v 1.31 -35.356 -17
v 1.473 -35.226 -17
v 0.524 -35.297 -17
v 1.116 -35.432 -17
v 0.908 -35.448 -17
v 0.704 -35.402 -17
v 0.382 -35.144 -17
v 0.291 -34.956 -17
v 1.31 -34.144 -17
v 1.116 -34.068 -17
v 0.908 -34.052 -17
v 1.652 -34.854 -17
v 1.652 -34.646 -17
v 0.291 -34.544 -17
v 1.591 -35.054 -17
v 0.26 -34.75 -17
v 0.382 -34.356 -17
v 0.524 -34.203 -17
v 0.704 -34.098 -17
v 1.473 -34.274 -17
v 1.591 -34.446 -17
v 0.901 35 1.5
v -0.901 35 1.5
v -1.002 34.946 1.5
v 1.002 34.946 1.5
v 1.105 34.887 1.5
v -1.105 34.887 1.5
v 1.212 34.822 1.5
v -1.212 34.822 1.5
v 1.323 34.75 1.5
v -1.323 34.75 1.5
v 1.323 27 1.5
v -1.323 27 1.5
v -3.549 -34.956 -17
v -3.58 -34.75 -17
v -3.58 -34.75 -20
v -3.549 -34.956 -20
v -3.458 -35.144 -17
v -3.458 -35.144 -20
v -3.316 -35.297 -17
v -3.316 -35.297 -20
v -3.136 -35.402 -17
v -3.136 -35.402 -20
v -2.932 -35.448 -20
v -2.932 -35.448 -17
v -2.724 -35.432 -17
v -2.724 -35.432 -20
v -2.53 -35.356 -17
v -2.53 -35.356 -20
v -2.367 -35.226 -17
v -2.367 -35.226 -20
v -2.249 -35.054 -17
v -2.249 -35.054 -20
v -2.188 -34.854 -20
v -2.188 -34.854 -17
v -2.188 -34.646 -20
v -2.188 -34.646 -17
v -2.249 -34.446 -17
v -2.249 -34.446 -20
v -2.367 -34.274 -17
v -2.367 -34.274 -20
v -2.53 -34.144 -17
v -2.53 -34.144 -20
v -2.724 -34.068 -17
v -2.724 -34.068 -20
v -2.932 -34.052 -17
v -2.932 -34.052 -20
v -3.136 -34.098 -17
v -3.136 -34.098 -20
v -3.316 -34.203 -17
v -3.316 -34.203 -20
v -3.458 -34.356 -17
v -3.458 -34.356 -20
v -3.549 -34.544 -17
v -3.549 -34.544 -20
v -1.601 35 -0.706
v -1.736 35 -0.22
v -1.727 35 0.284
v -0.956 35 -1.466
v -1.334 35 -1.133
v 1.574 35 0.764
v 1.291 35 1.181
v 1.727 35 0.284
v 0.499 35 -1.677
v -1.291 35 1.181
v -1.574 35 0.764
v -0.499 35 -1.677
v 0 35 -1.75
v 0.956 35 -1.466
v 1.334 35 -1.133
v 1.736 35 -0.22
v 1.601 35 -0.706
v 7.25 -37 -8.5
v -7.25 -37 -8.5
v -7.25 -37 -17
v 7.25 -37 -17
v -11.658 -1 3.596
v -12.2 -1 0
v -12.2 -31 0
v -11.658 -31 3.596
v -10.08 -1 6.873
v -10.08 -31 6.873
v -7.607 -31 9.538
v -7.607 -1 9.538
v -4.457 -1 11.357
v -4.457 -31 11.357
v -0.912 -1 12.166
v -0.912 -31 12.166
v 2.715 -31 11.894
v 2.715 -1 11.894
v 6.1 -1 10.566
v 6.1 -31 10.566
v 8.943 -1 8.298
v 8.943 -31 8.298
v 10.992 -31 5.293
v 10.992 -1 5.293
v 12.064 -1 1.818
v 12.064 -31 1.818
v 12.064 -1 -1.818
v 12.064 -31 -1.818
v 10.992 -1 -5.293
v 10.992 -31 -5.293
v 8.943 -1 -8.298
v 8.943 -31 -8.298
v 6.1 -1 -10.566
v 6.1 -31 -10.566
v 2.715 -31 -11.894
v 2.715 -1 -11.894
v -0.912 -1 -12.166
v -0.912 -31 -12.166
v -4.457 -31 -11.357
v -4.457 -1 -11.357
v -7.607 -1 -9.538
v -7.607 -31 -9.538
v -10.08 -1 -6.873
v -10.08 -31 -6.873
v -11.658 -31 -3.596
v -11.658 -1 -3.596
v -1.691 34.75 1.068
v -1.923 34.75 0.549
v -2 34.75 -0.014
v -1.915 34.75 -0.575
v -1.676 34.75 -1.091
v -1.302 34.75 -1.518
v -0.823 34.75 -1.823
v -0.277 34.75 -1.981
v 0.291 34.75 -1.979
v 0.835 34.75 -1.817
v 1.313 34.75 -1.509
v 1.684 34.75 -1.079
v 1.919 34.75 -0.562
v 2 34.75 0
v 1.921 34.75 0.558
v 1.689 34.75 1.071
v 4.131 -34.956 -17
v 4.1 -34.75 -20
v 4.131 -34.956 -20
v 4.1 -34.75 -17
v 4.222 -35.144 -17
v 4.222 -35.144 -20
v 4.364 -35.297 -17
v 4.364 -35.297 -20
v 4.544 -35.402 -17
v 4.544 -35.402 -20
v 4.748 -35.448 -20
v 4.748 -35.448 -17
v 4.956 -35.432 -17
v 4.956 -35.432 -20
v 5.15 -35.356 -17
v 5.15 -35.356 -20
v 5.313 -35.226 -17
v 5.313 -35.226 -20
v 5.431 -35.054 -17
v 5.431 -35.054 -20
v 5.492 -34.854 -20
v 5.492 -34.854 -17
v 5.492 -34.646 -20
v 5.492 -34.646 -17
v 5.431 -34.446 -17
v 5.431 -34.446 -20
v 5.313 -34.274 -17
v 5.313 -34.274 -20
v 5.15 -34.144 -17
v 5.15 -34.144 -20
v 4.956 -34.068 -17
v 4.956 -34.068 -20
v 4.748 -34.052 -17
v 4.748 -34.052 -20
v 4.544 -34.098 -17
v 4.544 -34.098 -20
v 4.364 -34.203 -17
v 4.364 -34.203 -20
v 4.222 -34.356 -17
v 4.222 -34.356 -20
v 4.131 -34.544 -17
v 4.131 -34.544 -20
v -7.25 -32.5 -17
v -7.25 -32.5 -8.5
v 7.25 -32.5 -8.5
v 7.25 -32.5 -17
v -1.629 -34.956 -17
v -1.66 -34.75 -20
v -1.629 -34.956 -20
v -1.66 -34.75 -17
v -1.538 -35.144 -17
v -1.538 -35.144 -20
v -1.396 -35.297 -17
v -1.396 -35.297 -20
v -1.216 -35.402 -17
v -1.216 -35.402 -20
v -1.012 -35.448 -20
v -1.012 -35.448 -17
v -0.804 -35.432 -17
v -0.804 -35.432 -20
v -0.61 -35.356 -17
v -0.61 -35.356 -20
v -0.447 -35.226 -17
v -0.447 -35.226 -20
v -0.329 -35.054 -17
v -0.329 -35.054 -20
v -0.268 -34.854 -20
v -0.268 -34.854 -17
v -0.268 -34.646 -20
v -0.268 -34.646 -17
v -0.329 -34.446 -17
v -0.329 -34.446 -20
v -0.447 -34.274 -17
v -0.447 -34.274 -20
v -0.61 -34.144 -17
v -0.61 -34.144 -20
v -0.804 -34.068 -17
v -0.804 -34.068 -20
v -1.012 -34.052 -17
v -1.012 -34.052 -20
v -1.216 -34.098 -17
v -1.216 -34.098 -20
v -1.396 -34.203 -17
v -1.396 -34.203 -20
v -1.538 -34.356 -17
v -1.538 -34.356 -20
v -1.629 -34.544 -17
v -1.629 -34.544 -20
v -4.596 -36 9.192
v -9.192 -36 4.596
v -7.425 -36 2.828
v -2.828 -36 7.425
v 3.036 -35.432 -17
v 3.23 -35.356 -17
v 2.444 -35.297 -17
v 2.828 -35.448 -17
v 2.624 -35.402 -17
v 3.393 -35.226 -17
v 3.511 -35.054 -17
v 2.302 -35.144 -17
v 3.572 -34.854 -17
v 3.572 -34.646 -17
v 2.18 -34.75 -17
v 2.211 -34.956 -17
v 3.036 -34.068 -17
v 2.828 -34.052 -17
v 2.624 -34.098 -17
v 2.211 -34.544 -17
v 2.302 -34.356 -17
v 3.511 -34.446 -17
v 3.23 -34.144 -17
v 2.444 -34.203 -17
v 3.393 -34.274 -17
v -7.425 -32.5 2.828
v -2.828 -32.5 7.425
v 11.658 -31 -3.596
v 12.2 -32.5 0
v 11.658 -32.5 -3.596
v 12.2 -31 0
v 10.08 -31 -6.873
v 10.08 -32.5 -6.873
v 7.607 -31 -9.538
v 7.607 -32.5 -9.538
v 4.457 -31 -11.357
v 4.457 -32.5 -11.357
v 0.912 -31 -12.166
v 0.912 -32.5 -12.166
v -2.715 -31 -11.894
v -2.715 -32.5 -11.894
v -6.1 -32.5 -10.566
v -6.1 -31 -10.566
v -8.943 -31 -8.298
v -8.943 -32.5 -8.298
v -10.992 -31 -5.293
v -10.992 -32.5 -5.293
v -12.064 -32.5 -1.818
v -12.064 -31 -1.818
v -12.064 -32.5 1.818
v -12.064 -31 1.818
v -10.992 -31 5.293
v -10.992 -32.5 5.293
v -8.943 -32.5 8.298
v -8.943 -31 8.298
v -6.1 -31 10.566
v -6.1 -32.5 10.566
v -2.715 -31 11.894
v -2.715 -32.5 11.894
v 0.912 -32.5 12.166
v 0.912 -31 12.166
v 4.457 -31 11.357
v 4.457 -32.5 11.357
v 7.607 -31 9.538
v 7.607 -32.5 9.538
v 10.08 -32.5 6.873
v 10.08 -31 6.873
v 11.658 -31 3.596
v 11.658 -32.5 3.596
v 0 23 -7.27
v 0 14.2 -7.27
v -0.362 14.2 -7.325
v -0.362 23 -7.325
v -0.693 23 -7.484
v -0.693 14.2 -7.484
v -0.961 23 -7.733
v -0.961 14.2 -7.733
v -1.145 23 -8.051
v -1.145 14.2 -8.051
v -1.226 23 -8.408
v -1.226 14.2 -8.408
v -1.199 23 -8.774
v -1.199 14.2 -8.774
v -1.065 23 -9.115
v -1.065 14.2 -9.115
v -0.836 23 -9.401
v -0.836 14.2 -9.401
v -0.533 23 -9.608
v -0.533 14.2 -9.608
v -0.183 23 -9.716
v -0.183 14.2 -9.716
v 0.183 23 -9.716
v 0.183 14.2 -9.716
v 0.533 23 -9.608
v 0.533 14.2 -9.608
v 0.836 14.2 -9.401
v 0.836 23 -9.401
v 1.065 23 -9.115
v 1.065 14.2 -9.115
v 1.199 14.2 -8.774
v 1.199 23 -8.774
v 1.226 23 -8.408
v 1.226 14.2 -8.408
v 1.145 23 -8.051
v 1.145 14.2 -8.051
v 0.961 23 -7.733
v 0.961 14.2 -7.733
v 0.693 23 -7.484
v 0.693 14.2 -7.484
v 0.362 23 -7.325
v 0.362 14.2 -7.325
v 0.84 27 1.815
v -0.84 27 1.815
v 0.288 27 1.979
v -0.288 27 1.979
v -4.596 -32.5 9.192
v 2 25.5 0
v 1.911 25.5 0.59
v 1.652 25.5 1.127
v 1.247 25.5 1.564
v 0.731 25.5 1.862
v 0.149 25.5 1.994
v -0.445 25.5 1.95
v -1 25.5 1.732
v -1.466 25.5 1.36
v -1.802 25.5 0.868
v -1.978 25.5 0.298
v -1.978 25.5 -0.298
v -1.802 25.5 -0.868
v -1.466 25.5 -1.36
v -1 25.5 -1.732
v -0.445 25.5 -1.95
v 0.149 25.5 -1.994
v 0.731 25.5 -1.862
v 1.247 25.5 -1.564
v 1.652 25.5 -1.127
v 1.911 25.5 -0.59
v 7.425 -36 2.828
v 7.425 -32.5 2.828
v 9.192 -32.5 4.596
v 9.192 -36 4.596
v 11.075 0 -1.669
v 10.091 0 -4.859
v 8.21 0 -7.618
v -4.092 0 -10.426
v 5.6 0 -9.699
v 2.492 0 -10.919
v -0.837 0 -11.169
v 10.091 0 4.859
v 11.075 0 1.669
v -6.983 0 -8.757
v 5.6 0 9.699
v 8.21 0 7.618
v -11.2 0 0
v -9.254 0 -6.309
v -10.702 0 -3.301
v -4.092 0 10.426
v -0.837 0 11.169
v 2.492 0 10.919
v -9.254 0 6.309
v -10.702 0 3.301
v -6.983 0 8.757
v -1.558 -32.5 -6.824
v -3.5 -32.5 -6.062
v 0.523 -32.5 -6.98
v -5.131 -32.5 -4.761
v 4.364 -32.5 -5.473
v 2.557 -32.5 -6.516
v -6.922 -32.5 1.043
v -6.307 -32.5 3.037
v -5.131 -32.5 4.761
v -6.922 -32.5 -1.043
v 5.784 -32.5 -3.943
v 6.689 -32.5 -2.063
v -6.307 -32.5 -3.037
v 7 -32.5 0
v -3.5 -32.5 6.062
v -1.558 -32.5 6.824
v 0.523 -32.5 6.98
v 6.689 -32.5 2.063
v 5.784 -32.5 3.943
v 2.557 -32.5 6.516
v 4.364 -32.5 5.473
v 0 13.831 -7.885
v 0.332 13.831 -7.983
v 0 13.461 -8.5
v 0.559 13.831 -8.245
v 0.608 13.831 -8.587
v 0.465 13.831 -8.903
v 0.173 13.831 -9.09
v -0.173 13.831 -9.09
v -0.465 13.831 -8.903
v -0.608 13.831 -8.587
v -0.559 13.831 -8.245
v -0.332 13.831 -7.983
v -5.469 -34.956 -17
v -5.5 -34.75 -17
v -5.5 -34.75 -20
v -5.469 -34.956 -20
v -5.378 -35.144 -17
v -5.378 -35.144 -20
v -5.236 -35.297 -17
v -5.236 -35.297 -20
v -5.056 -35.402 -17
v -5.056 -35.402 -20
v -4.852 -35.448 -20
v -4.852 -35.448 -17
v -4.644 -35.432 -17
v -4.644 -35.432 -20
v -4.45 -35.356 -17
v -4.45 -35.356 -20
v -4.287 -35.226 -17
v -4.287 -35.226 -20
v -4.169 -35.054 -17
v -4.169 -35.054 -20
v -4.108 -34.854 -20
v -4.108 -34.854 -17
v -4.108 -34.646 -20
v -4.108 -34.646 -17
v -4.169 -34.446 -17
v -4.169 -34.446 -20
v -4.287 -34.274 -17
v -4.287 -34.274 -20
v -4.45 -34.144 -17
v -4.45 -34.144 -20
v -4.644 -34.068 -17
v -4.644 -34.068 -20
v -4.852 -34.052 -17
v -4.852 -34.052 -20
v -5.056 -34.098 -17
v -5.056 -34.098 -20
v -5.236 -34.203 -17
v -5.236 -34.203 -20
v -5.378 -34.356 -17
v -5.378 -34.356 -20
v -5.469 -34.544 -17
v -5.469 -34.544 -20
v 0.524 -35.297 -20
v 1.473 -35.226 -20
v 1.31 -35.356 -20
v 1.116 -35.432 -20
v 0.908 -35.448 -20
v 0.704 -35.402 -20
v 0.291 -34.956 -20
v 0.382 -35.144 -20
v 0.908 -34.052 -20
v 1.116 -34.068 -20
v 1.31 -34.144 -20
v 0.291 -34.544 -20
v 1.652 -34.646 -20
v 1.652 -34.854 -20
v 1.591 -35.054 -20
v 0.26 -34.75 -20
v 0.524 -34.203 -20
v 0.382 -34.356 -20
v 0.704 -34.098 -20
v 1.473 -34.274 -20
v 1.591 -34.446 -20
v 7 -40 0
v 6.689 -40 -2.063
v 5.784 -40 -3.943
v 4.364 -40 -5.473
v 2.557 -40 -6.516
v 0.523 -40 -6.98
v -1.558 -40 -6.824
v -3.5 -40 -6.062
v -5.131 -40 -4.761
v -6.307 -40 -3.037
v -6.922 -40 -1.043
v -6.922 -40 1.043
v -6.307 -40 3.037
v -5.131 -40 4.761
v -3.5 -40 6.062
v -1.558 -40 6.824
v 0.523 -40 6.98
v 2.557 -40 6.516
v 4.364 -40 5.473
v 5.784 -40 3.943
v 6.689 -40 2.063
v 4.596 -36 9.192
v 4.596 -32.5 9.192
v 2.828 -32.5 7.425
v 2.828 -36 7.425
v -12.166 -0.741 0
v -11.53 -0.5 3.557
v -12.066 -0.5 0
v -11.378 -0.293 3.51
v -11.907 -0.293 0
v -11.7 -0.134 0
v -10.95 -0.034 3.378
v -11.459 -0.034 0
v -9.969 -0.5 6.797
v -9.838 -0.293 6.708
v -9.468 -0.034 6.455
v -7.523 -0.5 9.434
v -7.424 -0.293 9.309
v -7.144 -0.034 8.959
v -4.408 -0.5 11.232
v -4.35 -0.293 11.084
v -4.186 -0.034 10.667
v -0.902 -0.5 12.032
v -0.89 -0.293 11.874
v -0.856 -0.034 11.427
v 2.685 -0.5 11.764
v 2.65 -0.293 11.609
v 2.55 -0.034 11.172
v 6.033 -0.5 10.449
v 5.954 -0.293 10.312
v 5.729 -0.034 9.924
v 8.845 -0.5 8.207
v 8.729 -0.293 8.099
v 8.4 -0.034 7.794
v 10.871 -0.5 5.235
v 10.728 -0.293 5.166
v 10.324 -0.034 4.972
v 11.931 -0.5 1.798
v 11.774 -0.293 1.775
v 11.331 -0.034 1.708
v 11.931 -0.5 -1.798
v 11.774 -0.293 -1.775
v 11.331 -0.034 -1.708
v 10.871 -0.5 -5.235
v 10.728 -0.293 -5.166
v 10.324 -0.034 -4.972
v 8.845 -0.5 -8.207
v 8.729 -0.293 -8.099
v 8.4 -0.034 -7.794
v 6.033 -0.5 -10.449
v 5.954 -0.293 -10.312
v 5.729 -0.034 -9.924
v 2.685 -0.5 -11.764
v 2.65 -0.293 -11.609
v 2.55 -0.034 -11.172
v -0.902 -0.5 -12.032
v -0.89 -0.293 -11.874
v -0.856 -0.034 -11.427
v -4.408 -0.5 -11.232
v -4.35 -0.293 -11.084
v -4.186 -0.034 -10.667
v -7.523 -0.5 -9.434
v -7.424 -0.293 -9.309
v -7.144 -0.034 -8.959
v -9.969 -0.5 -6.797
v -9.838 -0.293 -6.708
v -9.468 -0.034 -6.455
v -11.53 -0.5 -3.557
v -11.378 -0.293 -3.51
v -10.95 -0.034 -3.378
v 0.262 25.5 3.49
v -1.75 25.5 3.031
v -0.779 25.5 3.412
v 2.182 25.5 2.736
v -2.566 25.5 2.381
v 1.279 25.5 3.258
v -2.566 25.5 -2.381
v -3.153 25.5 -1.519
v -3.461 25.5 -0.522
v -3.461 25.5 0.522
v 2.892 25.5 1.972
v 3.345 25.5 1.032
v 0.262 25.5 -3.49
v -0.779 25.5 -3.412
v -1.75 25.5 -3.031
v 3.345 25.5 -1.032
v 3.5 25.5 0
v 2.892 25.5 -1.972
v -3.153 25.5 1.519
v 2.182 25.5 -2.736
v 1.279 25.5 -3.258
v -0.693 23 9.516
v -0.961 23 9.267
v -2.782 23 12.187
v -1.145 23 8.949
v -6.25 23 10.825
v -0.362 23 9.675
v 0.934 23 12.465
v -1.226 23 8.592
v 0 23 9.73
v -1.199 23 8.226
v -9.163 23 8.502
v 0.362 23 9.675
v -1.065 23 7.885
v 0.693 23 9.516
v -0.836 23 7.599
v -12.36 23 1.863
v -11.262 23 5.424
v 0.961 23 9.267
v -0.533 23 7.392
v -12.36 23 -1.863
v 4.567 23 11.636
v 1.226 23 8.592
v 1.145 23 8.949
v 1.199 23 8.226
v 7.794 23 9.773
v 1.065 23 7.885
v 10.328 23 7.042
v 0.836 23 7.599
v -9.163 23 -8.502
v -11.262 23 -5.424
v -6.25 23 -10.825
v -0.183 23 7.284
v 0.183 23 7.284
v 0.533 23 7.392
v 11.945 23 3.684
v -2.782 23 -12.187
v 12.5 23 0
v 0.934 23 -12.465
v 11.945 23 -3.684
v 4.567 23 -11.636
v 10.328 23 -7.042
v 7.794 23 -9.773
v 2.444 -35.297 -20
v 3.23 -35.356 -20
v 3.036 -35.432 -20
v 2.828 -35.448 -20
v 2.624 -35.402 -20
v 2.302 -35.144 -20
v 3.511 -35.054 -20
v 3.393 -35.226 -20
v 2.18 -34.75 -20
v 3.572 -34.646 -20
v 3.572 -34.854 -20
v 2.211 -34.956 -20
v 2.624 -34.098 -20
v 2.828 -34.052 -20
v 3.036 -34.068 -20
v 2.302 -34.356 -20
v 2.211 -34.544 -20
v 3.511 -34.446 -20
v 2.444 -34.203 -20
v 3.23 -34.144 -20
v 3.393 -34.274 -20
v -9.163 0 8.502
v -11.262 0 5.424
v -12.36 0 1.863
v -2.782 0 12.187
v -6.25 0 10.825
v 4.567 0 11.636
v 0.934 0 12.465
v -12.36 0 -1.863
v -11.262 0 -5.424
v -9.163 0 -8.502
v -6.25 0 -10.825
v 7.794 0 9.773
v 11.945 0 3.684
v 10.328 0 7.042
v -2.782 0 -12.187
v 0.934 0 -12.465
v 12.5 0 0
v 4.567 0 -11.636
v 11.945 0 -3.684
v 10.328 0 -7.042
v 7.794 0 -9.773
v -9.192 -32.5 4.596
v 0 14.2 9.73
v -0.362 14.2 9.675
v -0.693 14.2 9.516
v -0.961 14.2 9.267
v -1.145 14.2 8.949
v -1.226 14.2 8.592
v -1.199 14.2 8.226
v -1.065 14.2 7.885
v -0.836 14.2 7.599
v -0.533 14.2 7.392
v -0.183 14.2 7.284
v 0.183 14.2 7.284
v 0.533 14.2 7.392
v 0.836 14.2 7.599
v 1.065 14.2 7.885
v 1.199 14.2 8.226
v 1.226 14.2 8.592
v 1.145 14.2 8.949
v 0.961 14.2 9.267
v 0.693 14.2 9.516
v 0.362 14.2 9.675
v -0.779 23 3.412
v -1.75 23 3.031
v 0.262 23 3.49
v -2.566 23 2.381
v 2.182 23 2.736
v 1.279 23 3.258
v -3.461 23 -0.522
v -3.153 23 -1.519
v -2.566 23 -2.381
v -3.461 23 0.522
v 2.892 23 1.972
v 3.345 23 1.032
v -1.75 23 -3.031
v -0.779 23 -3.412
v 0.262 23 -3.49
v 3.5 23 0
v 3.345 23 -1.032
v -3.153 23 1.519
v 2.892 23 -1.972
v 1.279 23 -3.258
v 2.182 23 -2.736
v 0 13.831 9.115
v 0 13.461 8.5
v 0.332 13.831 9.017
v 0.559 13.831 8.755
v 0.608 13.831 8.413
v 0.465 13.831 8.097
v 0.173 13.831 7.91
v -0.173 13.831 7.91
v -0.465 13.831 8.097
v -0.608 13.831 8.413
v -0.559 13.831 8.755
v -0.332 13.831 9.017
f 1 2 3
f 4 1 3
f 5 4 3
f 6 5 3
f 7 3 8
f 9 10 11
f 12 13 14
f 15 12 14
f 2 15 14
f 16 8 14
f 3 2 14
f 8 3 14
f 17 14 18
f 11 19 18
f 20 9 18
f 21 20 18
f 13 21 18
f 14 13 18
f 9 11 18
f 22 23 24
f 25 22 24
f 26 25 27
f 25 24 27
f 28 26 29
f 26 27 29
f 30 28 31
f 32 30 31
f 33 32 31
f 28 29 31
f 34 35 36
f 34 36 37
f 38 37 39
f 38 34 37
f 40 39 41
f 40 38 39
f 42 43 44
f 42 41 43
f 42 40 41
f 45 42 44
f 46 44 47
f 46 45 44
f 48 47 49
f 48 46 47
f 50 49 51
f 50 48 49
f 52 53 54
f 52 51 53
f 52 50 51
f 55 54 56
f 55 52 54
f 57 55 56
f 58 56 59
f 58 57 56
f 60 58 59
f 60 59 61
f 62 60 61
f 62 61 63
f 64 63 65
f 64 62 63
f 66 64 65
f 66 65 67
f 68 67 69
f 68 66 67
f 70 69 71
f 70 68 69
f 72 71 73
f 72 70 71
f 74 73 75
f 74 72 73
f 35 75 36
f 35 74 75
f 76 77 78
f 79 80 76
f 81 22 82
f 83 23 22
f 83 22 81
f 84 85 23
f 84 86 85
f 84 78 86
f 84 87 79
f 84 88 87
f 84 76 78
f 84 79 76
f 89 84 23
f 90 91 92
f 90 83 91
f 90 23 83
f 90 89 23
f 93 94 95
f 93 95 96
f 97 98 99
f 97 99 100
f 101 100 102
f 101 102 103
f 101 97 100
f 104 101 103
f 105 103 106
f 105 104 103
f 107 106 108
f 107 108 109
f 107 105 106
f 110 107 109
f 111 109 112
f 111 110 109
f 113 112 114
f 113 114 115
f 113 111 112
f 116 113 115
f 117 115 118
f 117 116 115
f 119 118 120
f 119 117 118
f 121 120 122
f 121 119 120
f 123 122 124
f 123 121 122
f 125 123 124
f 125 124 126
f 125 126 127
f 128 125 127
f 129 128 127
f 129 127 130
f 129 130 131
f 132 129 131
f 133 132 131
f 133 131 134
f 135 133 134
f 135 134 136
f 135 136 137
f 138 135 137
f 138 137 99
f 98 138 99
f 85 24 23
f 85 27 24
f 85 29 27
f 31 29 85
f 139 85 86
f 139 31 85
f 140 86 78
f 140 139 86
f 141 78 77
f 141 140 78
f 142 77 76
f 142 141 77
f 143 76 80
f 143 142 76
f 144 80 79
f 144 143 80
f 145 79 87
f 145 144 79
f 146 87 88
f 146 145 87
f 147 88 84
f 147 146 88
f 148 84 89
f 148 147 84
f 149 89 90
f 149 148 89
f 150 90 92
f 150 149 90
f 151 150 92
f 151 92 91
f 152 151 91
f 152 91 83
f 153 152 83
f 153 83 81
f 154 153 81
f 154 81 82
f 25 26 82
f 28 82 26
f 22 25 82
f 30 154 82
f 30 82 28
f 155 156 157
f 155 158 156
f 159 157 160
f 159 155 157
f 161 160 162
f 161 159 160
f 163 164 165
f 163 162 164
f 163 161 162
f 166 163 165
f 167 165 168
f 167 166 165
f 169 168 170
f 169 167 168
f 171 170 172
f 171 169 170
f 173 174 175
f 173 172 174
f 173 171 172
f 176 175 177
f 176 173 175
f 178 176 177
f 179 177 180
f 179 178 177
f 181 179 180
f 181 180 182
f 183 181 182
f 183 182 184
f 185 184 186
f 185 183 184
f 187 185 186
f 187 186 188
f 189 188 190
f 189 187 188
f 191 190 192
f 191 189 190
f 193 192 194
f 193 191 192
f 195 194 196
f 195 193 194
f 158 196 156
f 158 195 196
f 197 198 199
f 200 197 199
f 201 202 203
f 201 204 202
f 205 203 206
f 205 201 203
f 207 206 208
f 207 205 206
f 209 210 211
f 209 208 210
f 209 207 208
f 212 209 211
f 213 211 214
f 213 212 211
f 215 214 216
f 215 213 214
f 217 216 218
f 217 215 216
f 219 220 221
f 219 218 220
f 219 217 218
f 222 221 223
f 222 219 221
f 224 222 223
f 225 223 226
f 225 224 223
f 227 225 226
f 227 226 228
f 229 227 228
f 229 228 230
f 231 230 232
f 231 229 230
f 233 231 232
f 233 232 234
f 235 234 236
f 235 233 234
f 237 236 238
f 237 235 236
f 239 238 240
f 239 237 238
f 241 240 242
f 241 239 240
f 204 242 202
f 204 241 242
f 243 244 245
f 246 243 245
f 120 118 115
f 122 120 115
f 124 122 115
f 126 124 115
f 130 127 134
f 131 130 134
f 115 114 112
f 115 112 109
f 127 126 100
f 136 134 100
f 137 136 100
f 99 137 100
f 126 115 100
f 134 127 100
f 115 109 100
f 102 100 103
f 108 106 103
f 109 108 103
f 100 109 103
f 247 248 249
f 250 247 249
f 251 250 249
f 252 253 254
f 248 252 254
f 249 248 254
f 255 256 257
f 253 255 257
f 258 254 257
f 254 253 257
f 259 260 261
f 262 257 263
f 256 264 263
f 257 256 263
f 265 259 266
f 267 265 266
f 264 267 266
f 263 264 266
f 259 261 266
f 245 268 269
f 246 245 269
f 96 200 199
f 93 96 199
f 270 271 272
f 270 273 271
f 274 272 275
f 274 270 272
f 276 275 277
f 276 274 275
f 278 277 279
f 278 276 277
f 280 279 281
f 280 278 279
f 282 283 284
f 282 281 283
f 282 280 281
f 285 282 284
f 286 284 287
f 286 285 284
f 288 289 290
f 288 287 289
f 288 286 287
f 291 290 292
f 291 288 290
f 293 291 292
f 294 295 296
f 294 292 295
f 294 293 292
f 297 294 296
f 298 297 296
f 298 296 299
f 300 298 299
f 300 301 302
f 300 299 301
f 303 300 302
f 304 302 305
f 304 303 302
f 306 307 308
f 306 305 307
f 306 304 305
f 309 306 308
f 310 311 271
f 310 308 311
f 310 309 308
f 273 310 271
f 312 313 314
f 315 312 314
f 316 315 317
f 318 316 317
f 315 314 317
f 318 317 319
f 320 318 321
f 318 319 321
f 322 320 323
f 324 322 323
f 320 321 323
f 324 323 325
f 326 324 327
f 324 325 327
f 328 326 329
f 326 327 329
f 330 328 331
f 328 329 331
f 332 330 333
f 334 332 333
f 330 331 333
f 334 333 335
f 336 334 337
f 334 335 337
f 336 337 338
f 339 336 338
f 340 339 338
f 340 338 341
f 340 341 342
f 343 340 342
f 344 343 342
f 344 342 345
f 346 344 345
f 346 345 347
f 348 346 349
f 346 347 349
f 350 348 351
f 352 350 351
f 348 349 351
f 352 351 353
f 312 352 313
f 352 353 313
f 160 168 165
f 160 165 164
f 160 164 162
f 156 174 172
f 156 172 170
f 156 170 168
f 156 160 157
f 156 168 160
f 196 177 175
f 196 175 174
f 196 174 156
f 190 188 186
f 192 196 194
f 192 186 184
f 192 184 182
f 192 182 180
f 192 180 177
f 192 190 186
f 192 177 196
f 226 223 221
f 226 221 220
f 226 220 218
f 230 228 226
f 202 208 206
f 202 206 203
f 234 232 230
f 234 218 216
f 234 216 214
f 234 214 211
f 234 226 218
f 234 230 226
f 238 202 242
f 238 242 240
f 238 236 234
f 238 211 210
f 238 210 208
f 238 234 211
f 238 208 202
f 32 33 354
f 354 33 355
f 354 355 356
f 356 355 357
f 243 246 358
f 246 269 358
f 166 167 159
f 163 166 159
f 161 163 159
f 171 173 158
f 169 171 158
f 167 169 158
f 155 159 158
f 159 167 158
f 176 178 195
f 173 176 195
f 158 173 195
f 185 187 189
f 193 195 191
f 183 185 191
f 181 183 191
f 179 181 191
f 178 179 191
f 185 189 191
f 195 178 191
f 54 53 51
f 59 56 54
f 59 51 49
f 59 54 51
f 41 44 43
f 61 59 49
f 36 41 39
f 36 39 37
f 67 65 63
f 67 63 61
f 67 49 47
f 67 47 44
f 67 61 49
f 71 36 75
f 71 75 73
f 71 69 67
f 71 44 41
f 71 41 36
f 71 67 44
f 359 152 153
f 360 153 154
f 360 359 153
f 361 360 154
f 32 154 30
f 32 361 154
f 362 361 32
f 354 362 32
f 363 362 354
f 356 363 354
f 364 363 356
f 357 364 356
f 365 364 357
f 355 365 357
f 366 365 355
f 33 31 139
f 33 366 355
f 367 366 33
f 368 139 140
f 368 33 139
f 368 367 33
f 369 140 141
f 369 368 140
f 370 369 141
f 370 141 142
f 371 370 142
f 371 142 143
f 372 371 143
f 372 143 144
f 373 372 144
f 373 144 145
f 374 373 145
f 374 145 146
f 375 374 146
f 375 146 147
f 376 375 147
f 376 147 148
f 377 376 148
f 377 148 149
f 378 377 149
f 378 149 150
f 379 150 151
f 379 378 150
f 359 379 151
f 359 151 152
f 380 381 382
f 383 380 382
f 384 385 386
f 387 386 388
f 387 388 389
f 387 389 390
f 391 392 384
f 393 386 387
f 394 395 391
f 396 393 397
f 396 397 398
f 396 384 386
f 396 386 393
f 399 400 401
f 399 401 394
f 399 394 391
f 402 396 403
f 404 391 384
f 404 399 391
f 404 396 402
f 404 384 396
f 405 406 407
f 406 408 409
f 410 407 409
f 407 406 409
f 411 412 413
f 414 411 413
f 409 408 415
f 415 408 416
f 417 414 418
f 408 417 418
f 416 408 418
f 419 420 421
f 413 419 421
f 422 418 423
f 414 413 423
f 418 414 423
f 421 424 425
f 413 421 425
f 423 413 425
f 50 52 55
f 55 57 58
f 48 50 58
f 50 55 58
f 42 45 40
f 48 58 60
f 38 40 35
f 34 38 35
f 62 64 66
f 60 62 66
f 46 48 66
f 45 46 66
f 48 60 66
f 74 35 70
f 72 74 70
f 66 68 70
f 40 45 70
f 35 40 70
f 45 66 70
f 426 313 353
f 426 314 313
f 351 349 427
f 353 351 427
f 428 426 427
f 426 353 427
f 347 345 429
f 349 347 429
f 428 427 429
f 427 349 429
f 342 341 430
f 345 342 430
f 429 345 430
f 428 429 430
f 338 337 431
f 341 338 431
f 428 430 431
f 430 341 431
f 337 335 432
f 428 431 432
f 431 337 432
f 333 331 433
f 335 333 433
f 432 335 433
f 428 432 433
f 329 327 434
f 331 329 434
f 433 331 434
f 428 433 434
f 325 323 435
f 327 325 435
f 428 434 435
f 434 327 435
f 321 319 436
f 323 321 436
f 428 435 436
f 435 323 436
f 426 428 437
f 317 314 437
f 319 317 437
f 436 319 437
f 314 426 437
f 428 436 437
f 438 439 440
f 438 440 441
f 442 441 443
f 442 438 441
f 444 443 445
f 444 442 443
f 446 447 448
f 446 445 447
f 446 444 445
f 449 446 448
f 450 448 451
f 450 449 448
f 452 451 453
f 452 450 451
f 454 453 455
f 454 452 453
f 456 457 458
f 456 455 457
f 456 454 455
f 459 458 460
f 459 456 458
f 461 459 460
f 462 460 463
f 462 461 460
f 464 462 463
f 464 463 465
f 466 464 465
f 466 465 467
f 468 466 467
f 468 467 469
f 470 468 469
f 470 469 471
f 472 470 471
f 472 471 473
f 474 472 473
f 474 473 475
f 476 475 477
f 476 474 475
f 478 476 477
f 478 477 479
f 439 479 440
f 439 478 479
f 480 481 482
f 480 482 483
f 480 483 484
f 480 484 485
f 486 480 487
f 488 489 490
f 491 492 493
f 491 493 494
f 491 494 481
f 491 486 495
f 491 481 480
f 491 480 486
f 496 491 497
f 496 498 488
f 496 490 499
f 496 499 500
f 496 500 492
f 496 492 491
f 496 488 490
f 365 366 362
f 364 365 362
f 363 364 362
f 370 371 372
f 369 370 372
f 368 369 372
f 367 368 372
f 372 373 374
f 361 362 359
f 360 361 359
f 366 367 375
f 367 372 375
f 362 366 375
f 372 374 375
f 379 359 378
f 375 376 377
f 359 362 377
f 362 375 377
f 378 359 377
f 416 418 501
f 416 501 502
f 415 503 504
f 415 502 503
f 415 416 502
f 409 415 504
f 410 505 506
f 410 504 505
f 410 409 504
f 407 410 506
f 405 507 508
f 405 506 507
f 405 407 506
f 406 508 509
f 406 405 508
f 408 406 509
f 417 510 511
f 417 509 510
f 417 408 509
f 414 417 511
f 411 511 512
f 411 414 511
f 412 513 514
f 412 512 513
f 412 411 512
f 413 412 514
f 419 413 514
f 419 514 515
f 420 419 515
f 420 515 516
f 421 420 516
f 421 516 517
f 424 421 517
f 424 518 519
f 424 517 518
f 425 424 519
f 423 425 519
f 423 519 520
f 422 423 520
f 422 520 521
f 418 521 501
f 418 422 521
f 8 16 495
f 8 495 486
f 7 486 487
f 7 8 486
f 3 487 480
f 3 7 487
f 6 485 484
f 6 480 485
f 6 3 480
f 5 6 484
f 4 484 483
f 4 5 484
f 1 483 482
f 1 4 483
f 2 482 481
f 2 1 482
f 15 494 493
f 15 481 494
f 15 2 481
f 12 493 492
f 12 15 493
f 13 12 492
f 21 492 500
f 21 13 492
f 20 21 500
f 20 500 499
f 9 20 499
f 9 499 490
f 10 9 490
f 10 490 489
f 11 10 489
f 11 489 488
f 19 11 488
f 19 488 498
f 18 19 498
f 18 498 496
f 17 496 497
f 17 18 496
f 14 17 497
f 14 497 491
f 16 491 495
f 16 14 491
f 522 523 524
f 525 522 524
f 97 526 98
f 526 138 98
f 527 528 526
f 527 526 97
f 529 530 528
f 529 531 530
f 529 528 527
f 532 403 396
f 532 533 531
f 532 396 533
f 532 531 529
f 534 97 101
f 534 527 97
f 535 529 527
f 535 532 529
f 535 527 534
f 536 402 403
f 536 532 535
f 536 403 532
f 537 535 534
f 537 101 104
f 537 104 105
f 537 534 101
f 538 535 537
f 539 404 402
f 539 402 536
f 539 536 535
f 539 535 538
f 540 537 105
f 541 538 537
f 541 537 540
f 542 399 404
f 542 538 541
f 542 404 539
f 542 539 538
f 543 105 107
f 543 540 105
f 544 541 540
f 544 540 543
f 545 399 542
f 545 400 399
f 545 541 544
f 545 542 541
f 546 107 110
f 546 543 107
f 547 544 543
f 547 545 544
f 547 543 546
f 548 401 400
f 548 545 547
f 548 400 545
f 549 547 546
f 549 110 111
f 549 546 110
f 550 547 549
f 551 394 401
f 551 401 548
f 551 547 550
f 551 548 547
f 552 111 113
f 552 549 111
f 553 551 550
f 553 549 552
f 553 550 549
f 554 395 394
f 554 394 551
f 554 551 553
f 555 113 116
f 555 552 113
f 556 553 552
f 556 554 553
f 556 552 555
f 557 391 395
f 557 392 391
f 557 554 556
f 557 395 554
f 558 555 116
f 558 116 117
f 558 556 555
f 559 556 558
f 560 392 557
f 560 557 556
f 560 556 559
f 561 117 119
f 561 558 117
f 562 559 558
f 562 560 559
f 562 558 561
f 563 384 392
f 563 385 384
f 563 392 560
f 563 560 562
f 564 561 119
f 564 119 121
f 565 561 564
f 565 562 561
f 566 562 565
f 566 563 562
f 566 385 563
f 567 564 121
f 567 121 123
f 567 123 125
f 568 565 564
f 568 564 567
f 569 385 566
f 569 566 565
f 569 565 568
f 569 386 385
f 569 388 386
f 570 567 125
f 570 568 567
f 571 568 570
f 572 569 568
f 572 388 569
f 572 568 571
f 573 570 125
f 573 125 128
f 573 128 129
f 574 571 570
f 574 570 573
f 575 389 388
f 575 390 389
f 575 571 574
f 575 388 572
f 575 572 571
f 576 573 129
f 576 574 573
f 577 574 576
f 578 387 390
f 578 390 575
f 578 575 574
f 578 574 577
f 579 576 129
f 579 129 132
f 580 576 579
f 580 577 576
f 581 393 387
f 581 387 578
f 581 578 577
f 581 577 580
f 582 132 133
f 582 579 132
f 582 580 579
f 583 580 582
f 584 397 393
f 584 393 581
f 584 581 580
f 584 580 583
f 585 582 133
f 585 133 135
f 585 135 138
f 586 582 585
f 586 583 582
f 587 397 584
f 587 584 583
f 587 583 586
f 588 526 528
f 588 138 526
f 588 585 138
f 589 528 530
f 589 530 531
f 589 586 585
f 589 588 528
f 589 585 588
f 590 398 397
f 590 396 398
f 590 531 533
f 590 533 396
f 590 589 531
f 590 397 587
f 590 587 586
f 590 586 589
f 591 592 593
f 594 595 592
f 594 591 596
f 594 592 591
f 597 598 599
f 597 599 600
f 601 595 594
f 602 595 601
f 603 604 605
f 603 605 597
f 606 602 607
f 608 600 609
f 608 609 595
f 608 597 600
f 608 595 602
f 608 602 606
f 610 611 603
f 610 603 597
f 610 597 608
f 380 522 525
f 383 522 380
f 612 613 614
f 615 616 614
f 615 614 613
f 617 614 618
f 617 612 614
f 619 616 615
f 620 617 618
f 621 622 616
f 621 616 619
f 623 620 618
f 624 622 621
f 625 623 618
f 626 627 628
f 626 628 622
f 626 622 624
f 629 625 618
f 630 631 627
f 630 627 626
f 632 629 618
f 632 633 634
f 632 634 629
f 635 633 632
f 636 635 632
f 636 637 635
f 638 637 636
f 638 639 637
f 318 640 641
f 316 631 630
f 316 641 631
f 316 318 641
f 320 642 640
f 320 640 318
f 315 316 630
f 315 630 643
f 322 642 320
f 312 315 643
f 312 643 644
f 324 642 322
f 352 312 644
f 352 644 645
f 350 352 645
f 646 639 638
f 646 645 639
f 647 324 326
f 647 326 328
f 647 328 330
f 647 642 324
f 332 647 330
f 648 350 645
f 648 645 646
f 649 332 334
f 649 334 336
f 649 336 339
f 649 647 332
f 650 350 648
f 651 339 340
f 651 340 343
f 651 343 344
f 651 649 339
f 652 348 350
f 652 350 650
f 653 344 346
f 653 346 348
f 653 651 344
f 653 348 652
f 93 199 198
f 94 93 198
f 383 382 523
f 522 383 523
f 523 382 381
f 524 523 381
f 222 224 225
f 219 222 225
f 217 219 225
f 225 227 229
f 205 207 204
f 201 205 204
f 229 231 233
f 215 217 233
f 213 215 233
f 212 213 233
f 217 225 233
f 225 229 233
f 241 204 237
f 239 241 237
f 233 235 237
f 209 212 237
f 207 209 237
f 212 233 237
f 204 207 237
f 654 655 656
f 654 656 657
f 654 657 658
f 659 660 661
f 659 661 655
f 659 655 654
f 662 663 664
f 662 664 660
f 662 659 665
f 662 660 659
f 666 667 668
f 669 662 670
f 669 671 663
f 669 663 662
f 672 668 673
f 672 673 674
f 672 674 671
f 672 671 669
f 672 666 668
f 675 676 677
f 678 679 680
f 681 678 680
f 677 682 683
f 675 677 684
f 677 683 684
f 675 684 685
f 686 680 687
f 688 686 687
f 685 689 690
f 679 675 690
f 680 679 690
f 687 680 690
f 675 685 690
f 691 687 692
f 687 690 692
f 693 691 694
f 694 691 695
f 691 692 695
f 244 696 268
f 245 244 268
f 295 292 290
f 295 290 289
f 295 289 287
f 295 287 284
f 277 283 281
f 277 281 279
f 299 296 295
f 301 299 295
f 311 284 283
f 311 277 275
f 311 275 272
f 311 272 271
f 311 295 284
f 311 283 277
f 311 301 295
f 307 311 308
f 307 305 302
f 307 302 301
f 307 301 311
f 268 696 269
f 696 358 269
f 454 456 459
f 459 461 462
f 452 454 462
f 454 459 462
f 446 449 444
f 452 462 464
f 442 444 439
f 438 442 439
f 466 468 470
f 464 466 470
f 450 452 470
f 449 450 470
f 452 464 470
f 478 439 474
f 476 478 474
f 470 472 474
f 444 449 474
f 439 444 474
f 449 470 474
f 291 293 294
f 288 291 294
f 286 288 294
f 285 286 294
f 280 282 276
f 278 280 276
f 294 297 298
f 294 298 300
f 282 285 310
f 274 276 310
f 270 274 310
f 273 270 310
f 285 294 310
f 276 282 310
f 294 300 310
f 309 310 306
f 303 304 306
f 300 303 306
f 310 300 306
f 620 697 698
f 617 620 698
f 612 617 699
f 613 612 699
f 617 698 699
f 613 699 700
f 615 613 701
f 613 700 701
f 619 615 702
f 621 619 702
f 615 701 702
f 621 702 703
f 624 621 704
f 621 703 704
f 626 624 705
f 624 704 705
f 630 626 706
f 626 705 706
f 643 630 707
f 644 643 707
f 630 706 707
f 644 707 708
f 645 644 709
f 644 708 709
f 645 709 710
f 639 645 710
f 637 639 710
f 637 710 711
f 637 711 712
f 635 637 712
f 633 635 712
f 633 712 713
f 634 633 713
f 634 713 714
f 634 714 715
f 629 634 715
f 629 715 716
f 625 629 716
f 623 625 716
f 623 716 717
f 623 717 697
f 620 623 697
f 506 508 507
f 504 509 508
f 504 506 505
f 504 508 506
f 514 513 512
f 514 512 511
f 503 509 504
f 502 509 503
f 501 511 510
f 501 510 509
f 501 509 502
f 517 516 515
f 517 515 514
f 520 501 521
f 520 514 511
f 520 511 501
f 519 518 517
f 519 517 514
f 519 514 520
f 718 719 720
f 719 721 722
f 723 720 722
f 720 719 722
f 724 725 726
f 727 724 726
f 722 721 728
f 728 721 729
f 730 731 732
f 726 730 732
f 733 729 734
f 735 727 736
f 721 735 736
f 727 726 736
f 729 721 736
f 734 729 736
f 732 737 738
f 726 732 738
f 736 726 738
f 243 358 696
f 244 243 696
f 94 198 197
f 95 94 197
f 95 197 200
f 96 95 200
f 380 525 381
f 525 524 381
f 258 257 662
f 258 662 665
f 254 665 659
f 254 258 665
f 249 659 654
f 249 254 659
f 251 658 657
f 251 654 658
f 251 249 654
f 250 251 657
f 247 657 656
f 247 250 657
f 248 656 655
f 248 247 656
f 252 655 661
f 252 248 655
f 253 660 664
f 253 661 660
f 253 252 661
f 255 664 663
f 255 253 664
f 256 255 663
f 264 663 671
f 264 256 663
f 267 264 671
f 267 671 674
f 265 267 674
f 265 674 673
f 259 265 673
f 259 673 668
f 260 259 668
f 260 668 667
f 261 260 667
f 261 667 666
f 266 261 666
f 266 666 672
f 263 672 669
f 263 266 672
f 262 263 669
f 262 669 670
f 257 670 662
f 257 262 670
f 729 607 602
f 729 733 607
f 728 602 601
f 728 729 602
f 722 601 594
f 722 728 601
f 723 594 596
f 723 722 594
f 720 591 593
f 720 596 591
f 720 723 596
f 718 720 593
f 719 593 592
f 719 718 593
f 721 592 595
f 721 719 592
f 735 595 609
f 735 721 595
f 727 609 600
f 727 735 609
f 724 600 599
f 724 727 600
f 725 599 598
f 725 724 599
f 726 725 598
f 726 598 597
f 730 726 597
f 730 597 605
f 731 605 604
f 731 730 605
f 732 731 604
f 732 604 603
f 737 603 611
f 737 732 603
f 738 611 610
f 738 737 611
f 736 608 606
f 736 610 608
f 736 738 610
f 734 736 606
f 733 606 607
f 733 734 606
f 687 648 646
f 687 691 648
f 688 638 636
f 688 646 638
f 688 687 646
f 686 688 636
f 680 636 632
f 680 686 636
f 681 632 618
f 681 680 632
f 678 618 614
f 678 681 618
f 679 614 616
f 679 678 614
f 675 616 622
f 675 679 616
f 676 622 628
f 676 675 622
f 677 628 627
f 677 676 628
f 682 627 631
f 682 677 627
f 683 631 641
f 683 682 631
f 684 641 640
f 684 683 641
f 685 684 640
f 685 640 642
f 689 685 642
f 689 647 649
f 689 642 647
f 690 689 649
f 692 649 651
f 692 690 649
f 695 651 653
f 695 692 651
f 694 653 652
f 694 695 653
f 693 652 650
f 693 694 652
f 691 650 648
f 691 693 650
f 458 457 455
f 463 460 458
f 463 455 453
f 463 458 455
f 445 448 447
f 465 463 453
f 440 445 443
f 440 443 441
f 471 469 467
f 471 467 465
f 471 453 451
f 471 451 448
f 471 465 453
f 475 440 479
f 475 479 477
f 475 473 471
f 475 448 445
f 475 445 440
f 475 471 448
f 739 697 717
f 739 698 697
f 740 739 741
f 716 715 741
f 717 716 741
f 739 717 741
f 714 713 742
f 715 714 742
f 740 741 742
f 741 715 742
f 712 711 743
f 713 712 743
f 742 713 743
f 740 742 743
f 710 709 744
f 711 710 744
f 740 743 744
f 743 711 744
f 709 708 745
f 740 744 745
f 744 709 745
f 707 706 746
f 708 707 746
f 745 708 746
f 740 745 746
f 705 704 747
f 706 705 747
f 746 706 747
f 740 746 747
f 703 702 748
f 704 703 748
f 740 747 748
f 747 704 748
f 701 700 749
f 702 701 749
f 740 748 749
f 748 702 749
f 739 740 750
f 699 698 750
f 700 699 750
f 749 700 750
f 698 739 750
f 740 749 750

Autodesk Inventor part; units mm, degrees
ref_plane "YZ Plane" through (0, 0, 0) normal (1, 0, 0) x (0, 1, 0)
ref_plane "XZ Plane" through (0, 0, 0) normal (0, 1, 0) x (-1, 0, 0)
ref_plane "XY Plane" through (0, 0, 0) normal (0, 0, 1) x (1, 0, 0)
sketch "Sketch1" plane through (0, 0, 0) normal (0, 1, 0) x (-1, 0, 0)
  circle A0 centre (0, 0) radius 12.2
  dimension "d0" = 24.4
extrude "Extrusion1" add sketch "Sketch1" against normal blind 31
fillet "Fillet1" radius 1 1 edges at (12.2, 0, 0)
sketch "Sketch2" plane through (0, -31, 0) normal (0, -1, 0) x (1, 0, 0)
  circle A0 centre (0, 0) radius 12.2 projected
extrude "Extrusion2" add sketch "Sketch2" along normal blind 1.5 separate body
sketch "Sketch3" plane through (0, -32.5, 0) normal (0, -1, 0) x (1, 0, 0)
  circle A0 centre (0, 0) radius 7
  dimension "d6" = 14
extrude "Extrusion3" add sketch "Sketch3" along normal blind 7.5 separate body
sketch "Sketch4" plane through (0, -32.5, 0) normal (0, -1, 0) x (1, 0, 0)
  circle A0 centre (0, 0) radius 6.75 construction
  line L0 (-7.4246, 2.8284) -> (-2.8284, 7.4246)
  line L1 (-2.8284, 7.4246) -> (-4.5962, 9.1924)
  line L2 (-4.5962, 9.1924) -> (-9.1924, 4.5962)
  line L3 (-9.1924, 4.5962) -> (-7.4246, 2.8284)
  line L4 (-7.4246, 2.8284) -> (-4.5962, 9.1924) construction
  line L5 (-2.8284, 7.4246) -> (-9.1924, 4.5962) construction
  line L6 (0, 0) -> (-6.0104, 6.0104) construction
  line L7 (0, 0) -> (-12.2, 0) construction
  circle A1 centre (0, 0) radius 12.2 construction
  point P0 (4.773, -4.773)
  dimension "d9" = 13.5
  dimension "d10" = 6.5
  dimension "d11" = 2.5
  dimension "d12" = 45
  dimension "d13" = 16.5
extrude "Extrusion4" add sketch "Sketch4" along normal blind 3.5 separate body
pattern_circular "Circular Pattern1" count 2 over 90 about axis through (0, -32.5, 0) along (0, 1, 0) of "Extrusion4" bodies 4
sketch "Sketch5" plane through (0, -32.5, 0) normal (0, -1, 0) x (1, 0, 0)
  line L0 (-7.25, -17) -> (7.25, -17)
  line L1 (7.25, -17) -> (7.25, -8.5)
  line L2 (7.25, -8.5) -> (-7.25, -8.5)
  line L3 (-7.25, -8.5) -> (-7.25, -17)
  line L4 (-7.25, -17) -> (7.25, -8.5) construction
  line L5 (7.25, -17) -> (-7.25, -8.5) construction
  circle A0 centre (0, 0) radius 7 projected
  point P0 (0, -12.75)
  point P1 (0, -12.75)
  dimension "d19" = 17
  dimension "d20" = 8.5
  dimension "d21" = 14.5
extrude "Extrusion5" add sketch "Sketch5" along normal blind 4.5 separate body contours L3 L2 L1 L0
sketch "Sketch6" plane through (7.25, -32.5, -17) normal (0, 0, -1) x (-1, 0, 0)
  line L0 (12.05, -2.25) -> (10.13, -2.25) construction
  line L1 (10.13, -2.25) -> (8.21, -2.25) construction
  line L2 (8.21, -2.25) -> (6.29, -2.25) construction
  line L3 (6.29, -2.25) -> (4.37, -2.25) construction
  line L4 (4.37, -2.25) -> (2.45, -2.25) construction
  circle A0 centre (12.05, -2.25) radius 0.7
  circle A1 centre (10.13, -2.25) radius 0.7
  circle A2 centre (8.21, -2.25) radius 0.7
  circle A3 centre (6.29, -2.25) radius 0.7
  circle A4 centre (4.37, -2.25) radius 0.7
  circle A5 centre (2.45, -2.25) radius 0.7
  line L5 (14.5, 0) -> (14.5, -4.5) projected
  line L6 (14.5, -4.5) -> (0, -4.5) projected
  point P0 (7.25, 32.5)
  point P1 (14.5, -2.25)
  point P2 (7.25, -2.25)
  point P3 (7.25, -4.5)
  dimension "d24" = 9.6
  dimension "d25" = 1.4
extrude "Extrusion6" add sketch "Sketch6" along normal blind 3 separate body contours A0
extrude "Extrusion7" add sketch "Sketch6" along normal blind 3 separate body contours A1
extrude "Extrusion8" add sketch "Sketch6" along normal blind 3 separate body contours A2
extrude "Extrusion9" add sketch "Sketch6" along normal blind 3 separate body contours A3
extrude "Extrusion10" add sketch "Sketch6" along normal blind 3 separate body contours A4
extrude "Extrusion11" add sketch "Sketch6" along normal blind 3 separate body contours A5
sketch "Sketch7" plane through (0, 0, 0) normal (0, 1, 0) x (1, 0, 0)
  circle A0 centre (0, 0) radius 12.5
  dimension "d38" = 25
extrude "Extrusion12" add sketch "Sketch7" along normal blind 23 separate body
sketch "Sketch8" plane through (0, 23, 0) normal (0, 1, 0) x (1, 0, 0)
  circle A0 centre (0, 0) radius 11.2 construction
  circle A1 centre (0, 0) radius 3.5
  dimension "d41" = 7
extrude "Extrusion13" add sketch "Sketch8" along normal blind 2.5 separate body
sketch "Sketch9" plane through (0, 25.5, 0) normal (0, 1, 0) x (1, 0, 0)
  circle A0 centre (0, 0) radius 2
  dimension "d44" = 4
extrude "Extrusion14" add sketch "Sketch9" along normal blind 9.5 separate body
chamfer "Chamfer1" distance 0.25 angle 45 1 edges at (-2, 35, 0)
sketch "Sketch10" plane through (0, 35, 0) normal (0, 1, 0) x (1, 0, 0)
  line L0 (-1.3229, -2) -> (1.3229, -2)
  line L1 (1.3229, -2) -> (1.3229, -1.5)
  line L2 (1.3229, -1.5) -> (-1.3229, -1.5)
  line L3 (-1.3229, -1.5) -> (-1.3229, -2)
  circle A0 centre (0, 0) radius 2 construction
  dimension "d50" = 1.5
extrude "Extrusion15" cut sketch "Sketch10" against normal blind 8 bodies 14
sketch "Sketch11" plane through (0, 23, 0) normal (0, 1, 0) x (1, 0, 0)
  circle A0 centre (0, 0) radius 12.5 construction
  line L0 (0, 8.5) -> (0, -8.5) construction
  line L1 (7.25, 8.5) -> (-7.25, 8.5) construction
  dimension "d53" = 17
hole "Hole1" at (0, 23, -8.5) at (0, 23, 8.5) direction (0, -1, 0) diameter 2.459 depth 8.8 tip angle 118 bodies 12 thread size "M3x0.5" class "6H" standard "ISO Metric profile"
properties part number "JGA25-371_12VDC_65RPM"
